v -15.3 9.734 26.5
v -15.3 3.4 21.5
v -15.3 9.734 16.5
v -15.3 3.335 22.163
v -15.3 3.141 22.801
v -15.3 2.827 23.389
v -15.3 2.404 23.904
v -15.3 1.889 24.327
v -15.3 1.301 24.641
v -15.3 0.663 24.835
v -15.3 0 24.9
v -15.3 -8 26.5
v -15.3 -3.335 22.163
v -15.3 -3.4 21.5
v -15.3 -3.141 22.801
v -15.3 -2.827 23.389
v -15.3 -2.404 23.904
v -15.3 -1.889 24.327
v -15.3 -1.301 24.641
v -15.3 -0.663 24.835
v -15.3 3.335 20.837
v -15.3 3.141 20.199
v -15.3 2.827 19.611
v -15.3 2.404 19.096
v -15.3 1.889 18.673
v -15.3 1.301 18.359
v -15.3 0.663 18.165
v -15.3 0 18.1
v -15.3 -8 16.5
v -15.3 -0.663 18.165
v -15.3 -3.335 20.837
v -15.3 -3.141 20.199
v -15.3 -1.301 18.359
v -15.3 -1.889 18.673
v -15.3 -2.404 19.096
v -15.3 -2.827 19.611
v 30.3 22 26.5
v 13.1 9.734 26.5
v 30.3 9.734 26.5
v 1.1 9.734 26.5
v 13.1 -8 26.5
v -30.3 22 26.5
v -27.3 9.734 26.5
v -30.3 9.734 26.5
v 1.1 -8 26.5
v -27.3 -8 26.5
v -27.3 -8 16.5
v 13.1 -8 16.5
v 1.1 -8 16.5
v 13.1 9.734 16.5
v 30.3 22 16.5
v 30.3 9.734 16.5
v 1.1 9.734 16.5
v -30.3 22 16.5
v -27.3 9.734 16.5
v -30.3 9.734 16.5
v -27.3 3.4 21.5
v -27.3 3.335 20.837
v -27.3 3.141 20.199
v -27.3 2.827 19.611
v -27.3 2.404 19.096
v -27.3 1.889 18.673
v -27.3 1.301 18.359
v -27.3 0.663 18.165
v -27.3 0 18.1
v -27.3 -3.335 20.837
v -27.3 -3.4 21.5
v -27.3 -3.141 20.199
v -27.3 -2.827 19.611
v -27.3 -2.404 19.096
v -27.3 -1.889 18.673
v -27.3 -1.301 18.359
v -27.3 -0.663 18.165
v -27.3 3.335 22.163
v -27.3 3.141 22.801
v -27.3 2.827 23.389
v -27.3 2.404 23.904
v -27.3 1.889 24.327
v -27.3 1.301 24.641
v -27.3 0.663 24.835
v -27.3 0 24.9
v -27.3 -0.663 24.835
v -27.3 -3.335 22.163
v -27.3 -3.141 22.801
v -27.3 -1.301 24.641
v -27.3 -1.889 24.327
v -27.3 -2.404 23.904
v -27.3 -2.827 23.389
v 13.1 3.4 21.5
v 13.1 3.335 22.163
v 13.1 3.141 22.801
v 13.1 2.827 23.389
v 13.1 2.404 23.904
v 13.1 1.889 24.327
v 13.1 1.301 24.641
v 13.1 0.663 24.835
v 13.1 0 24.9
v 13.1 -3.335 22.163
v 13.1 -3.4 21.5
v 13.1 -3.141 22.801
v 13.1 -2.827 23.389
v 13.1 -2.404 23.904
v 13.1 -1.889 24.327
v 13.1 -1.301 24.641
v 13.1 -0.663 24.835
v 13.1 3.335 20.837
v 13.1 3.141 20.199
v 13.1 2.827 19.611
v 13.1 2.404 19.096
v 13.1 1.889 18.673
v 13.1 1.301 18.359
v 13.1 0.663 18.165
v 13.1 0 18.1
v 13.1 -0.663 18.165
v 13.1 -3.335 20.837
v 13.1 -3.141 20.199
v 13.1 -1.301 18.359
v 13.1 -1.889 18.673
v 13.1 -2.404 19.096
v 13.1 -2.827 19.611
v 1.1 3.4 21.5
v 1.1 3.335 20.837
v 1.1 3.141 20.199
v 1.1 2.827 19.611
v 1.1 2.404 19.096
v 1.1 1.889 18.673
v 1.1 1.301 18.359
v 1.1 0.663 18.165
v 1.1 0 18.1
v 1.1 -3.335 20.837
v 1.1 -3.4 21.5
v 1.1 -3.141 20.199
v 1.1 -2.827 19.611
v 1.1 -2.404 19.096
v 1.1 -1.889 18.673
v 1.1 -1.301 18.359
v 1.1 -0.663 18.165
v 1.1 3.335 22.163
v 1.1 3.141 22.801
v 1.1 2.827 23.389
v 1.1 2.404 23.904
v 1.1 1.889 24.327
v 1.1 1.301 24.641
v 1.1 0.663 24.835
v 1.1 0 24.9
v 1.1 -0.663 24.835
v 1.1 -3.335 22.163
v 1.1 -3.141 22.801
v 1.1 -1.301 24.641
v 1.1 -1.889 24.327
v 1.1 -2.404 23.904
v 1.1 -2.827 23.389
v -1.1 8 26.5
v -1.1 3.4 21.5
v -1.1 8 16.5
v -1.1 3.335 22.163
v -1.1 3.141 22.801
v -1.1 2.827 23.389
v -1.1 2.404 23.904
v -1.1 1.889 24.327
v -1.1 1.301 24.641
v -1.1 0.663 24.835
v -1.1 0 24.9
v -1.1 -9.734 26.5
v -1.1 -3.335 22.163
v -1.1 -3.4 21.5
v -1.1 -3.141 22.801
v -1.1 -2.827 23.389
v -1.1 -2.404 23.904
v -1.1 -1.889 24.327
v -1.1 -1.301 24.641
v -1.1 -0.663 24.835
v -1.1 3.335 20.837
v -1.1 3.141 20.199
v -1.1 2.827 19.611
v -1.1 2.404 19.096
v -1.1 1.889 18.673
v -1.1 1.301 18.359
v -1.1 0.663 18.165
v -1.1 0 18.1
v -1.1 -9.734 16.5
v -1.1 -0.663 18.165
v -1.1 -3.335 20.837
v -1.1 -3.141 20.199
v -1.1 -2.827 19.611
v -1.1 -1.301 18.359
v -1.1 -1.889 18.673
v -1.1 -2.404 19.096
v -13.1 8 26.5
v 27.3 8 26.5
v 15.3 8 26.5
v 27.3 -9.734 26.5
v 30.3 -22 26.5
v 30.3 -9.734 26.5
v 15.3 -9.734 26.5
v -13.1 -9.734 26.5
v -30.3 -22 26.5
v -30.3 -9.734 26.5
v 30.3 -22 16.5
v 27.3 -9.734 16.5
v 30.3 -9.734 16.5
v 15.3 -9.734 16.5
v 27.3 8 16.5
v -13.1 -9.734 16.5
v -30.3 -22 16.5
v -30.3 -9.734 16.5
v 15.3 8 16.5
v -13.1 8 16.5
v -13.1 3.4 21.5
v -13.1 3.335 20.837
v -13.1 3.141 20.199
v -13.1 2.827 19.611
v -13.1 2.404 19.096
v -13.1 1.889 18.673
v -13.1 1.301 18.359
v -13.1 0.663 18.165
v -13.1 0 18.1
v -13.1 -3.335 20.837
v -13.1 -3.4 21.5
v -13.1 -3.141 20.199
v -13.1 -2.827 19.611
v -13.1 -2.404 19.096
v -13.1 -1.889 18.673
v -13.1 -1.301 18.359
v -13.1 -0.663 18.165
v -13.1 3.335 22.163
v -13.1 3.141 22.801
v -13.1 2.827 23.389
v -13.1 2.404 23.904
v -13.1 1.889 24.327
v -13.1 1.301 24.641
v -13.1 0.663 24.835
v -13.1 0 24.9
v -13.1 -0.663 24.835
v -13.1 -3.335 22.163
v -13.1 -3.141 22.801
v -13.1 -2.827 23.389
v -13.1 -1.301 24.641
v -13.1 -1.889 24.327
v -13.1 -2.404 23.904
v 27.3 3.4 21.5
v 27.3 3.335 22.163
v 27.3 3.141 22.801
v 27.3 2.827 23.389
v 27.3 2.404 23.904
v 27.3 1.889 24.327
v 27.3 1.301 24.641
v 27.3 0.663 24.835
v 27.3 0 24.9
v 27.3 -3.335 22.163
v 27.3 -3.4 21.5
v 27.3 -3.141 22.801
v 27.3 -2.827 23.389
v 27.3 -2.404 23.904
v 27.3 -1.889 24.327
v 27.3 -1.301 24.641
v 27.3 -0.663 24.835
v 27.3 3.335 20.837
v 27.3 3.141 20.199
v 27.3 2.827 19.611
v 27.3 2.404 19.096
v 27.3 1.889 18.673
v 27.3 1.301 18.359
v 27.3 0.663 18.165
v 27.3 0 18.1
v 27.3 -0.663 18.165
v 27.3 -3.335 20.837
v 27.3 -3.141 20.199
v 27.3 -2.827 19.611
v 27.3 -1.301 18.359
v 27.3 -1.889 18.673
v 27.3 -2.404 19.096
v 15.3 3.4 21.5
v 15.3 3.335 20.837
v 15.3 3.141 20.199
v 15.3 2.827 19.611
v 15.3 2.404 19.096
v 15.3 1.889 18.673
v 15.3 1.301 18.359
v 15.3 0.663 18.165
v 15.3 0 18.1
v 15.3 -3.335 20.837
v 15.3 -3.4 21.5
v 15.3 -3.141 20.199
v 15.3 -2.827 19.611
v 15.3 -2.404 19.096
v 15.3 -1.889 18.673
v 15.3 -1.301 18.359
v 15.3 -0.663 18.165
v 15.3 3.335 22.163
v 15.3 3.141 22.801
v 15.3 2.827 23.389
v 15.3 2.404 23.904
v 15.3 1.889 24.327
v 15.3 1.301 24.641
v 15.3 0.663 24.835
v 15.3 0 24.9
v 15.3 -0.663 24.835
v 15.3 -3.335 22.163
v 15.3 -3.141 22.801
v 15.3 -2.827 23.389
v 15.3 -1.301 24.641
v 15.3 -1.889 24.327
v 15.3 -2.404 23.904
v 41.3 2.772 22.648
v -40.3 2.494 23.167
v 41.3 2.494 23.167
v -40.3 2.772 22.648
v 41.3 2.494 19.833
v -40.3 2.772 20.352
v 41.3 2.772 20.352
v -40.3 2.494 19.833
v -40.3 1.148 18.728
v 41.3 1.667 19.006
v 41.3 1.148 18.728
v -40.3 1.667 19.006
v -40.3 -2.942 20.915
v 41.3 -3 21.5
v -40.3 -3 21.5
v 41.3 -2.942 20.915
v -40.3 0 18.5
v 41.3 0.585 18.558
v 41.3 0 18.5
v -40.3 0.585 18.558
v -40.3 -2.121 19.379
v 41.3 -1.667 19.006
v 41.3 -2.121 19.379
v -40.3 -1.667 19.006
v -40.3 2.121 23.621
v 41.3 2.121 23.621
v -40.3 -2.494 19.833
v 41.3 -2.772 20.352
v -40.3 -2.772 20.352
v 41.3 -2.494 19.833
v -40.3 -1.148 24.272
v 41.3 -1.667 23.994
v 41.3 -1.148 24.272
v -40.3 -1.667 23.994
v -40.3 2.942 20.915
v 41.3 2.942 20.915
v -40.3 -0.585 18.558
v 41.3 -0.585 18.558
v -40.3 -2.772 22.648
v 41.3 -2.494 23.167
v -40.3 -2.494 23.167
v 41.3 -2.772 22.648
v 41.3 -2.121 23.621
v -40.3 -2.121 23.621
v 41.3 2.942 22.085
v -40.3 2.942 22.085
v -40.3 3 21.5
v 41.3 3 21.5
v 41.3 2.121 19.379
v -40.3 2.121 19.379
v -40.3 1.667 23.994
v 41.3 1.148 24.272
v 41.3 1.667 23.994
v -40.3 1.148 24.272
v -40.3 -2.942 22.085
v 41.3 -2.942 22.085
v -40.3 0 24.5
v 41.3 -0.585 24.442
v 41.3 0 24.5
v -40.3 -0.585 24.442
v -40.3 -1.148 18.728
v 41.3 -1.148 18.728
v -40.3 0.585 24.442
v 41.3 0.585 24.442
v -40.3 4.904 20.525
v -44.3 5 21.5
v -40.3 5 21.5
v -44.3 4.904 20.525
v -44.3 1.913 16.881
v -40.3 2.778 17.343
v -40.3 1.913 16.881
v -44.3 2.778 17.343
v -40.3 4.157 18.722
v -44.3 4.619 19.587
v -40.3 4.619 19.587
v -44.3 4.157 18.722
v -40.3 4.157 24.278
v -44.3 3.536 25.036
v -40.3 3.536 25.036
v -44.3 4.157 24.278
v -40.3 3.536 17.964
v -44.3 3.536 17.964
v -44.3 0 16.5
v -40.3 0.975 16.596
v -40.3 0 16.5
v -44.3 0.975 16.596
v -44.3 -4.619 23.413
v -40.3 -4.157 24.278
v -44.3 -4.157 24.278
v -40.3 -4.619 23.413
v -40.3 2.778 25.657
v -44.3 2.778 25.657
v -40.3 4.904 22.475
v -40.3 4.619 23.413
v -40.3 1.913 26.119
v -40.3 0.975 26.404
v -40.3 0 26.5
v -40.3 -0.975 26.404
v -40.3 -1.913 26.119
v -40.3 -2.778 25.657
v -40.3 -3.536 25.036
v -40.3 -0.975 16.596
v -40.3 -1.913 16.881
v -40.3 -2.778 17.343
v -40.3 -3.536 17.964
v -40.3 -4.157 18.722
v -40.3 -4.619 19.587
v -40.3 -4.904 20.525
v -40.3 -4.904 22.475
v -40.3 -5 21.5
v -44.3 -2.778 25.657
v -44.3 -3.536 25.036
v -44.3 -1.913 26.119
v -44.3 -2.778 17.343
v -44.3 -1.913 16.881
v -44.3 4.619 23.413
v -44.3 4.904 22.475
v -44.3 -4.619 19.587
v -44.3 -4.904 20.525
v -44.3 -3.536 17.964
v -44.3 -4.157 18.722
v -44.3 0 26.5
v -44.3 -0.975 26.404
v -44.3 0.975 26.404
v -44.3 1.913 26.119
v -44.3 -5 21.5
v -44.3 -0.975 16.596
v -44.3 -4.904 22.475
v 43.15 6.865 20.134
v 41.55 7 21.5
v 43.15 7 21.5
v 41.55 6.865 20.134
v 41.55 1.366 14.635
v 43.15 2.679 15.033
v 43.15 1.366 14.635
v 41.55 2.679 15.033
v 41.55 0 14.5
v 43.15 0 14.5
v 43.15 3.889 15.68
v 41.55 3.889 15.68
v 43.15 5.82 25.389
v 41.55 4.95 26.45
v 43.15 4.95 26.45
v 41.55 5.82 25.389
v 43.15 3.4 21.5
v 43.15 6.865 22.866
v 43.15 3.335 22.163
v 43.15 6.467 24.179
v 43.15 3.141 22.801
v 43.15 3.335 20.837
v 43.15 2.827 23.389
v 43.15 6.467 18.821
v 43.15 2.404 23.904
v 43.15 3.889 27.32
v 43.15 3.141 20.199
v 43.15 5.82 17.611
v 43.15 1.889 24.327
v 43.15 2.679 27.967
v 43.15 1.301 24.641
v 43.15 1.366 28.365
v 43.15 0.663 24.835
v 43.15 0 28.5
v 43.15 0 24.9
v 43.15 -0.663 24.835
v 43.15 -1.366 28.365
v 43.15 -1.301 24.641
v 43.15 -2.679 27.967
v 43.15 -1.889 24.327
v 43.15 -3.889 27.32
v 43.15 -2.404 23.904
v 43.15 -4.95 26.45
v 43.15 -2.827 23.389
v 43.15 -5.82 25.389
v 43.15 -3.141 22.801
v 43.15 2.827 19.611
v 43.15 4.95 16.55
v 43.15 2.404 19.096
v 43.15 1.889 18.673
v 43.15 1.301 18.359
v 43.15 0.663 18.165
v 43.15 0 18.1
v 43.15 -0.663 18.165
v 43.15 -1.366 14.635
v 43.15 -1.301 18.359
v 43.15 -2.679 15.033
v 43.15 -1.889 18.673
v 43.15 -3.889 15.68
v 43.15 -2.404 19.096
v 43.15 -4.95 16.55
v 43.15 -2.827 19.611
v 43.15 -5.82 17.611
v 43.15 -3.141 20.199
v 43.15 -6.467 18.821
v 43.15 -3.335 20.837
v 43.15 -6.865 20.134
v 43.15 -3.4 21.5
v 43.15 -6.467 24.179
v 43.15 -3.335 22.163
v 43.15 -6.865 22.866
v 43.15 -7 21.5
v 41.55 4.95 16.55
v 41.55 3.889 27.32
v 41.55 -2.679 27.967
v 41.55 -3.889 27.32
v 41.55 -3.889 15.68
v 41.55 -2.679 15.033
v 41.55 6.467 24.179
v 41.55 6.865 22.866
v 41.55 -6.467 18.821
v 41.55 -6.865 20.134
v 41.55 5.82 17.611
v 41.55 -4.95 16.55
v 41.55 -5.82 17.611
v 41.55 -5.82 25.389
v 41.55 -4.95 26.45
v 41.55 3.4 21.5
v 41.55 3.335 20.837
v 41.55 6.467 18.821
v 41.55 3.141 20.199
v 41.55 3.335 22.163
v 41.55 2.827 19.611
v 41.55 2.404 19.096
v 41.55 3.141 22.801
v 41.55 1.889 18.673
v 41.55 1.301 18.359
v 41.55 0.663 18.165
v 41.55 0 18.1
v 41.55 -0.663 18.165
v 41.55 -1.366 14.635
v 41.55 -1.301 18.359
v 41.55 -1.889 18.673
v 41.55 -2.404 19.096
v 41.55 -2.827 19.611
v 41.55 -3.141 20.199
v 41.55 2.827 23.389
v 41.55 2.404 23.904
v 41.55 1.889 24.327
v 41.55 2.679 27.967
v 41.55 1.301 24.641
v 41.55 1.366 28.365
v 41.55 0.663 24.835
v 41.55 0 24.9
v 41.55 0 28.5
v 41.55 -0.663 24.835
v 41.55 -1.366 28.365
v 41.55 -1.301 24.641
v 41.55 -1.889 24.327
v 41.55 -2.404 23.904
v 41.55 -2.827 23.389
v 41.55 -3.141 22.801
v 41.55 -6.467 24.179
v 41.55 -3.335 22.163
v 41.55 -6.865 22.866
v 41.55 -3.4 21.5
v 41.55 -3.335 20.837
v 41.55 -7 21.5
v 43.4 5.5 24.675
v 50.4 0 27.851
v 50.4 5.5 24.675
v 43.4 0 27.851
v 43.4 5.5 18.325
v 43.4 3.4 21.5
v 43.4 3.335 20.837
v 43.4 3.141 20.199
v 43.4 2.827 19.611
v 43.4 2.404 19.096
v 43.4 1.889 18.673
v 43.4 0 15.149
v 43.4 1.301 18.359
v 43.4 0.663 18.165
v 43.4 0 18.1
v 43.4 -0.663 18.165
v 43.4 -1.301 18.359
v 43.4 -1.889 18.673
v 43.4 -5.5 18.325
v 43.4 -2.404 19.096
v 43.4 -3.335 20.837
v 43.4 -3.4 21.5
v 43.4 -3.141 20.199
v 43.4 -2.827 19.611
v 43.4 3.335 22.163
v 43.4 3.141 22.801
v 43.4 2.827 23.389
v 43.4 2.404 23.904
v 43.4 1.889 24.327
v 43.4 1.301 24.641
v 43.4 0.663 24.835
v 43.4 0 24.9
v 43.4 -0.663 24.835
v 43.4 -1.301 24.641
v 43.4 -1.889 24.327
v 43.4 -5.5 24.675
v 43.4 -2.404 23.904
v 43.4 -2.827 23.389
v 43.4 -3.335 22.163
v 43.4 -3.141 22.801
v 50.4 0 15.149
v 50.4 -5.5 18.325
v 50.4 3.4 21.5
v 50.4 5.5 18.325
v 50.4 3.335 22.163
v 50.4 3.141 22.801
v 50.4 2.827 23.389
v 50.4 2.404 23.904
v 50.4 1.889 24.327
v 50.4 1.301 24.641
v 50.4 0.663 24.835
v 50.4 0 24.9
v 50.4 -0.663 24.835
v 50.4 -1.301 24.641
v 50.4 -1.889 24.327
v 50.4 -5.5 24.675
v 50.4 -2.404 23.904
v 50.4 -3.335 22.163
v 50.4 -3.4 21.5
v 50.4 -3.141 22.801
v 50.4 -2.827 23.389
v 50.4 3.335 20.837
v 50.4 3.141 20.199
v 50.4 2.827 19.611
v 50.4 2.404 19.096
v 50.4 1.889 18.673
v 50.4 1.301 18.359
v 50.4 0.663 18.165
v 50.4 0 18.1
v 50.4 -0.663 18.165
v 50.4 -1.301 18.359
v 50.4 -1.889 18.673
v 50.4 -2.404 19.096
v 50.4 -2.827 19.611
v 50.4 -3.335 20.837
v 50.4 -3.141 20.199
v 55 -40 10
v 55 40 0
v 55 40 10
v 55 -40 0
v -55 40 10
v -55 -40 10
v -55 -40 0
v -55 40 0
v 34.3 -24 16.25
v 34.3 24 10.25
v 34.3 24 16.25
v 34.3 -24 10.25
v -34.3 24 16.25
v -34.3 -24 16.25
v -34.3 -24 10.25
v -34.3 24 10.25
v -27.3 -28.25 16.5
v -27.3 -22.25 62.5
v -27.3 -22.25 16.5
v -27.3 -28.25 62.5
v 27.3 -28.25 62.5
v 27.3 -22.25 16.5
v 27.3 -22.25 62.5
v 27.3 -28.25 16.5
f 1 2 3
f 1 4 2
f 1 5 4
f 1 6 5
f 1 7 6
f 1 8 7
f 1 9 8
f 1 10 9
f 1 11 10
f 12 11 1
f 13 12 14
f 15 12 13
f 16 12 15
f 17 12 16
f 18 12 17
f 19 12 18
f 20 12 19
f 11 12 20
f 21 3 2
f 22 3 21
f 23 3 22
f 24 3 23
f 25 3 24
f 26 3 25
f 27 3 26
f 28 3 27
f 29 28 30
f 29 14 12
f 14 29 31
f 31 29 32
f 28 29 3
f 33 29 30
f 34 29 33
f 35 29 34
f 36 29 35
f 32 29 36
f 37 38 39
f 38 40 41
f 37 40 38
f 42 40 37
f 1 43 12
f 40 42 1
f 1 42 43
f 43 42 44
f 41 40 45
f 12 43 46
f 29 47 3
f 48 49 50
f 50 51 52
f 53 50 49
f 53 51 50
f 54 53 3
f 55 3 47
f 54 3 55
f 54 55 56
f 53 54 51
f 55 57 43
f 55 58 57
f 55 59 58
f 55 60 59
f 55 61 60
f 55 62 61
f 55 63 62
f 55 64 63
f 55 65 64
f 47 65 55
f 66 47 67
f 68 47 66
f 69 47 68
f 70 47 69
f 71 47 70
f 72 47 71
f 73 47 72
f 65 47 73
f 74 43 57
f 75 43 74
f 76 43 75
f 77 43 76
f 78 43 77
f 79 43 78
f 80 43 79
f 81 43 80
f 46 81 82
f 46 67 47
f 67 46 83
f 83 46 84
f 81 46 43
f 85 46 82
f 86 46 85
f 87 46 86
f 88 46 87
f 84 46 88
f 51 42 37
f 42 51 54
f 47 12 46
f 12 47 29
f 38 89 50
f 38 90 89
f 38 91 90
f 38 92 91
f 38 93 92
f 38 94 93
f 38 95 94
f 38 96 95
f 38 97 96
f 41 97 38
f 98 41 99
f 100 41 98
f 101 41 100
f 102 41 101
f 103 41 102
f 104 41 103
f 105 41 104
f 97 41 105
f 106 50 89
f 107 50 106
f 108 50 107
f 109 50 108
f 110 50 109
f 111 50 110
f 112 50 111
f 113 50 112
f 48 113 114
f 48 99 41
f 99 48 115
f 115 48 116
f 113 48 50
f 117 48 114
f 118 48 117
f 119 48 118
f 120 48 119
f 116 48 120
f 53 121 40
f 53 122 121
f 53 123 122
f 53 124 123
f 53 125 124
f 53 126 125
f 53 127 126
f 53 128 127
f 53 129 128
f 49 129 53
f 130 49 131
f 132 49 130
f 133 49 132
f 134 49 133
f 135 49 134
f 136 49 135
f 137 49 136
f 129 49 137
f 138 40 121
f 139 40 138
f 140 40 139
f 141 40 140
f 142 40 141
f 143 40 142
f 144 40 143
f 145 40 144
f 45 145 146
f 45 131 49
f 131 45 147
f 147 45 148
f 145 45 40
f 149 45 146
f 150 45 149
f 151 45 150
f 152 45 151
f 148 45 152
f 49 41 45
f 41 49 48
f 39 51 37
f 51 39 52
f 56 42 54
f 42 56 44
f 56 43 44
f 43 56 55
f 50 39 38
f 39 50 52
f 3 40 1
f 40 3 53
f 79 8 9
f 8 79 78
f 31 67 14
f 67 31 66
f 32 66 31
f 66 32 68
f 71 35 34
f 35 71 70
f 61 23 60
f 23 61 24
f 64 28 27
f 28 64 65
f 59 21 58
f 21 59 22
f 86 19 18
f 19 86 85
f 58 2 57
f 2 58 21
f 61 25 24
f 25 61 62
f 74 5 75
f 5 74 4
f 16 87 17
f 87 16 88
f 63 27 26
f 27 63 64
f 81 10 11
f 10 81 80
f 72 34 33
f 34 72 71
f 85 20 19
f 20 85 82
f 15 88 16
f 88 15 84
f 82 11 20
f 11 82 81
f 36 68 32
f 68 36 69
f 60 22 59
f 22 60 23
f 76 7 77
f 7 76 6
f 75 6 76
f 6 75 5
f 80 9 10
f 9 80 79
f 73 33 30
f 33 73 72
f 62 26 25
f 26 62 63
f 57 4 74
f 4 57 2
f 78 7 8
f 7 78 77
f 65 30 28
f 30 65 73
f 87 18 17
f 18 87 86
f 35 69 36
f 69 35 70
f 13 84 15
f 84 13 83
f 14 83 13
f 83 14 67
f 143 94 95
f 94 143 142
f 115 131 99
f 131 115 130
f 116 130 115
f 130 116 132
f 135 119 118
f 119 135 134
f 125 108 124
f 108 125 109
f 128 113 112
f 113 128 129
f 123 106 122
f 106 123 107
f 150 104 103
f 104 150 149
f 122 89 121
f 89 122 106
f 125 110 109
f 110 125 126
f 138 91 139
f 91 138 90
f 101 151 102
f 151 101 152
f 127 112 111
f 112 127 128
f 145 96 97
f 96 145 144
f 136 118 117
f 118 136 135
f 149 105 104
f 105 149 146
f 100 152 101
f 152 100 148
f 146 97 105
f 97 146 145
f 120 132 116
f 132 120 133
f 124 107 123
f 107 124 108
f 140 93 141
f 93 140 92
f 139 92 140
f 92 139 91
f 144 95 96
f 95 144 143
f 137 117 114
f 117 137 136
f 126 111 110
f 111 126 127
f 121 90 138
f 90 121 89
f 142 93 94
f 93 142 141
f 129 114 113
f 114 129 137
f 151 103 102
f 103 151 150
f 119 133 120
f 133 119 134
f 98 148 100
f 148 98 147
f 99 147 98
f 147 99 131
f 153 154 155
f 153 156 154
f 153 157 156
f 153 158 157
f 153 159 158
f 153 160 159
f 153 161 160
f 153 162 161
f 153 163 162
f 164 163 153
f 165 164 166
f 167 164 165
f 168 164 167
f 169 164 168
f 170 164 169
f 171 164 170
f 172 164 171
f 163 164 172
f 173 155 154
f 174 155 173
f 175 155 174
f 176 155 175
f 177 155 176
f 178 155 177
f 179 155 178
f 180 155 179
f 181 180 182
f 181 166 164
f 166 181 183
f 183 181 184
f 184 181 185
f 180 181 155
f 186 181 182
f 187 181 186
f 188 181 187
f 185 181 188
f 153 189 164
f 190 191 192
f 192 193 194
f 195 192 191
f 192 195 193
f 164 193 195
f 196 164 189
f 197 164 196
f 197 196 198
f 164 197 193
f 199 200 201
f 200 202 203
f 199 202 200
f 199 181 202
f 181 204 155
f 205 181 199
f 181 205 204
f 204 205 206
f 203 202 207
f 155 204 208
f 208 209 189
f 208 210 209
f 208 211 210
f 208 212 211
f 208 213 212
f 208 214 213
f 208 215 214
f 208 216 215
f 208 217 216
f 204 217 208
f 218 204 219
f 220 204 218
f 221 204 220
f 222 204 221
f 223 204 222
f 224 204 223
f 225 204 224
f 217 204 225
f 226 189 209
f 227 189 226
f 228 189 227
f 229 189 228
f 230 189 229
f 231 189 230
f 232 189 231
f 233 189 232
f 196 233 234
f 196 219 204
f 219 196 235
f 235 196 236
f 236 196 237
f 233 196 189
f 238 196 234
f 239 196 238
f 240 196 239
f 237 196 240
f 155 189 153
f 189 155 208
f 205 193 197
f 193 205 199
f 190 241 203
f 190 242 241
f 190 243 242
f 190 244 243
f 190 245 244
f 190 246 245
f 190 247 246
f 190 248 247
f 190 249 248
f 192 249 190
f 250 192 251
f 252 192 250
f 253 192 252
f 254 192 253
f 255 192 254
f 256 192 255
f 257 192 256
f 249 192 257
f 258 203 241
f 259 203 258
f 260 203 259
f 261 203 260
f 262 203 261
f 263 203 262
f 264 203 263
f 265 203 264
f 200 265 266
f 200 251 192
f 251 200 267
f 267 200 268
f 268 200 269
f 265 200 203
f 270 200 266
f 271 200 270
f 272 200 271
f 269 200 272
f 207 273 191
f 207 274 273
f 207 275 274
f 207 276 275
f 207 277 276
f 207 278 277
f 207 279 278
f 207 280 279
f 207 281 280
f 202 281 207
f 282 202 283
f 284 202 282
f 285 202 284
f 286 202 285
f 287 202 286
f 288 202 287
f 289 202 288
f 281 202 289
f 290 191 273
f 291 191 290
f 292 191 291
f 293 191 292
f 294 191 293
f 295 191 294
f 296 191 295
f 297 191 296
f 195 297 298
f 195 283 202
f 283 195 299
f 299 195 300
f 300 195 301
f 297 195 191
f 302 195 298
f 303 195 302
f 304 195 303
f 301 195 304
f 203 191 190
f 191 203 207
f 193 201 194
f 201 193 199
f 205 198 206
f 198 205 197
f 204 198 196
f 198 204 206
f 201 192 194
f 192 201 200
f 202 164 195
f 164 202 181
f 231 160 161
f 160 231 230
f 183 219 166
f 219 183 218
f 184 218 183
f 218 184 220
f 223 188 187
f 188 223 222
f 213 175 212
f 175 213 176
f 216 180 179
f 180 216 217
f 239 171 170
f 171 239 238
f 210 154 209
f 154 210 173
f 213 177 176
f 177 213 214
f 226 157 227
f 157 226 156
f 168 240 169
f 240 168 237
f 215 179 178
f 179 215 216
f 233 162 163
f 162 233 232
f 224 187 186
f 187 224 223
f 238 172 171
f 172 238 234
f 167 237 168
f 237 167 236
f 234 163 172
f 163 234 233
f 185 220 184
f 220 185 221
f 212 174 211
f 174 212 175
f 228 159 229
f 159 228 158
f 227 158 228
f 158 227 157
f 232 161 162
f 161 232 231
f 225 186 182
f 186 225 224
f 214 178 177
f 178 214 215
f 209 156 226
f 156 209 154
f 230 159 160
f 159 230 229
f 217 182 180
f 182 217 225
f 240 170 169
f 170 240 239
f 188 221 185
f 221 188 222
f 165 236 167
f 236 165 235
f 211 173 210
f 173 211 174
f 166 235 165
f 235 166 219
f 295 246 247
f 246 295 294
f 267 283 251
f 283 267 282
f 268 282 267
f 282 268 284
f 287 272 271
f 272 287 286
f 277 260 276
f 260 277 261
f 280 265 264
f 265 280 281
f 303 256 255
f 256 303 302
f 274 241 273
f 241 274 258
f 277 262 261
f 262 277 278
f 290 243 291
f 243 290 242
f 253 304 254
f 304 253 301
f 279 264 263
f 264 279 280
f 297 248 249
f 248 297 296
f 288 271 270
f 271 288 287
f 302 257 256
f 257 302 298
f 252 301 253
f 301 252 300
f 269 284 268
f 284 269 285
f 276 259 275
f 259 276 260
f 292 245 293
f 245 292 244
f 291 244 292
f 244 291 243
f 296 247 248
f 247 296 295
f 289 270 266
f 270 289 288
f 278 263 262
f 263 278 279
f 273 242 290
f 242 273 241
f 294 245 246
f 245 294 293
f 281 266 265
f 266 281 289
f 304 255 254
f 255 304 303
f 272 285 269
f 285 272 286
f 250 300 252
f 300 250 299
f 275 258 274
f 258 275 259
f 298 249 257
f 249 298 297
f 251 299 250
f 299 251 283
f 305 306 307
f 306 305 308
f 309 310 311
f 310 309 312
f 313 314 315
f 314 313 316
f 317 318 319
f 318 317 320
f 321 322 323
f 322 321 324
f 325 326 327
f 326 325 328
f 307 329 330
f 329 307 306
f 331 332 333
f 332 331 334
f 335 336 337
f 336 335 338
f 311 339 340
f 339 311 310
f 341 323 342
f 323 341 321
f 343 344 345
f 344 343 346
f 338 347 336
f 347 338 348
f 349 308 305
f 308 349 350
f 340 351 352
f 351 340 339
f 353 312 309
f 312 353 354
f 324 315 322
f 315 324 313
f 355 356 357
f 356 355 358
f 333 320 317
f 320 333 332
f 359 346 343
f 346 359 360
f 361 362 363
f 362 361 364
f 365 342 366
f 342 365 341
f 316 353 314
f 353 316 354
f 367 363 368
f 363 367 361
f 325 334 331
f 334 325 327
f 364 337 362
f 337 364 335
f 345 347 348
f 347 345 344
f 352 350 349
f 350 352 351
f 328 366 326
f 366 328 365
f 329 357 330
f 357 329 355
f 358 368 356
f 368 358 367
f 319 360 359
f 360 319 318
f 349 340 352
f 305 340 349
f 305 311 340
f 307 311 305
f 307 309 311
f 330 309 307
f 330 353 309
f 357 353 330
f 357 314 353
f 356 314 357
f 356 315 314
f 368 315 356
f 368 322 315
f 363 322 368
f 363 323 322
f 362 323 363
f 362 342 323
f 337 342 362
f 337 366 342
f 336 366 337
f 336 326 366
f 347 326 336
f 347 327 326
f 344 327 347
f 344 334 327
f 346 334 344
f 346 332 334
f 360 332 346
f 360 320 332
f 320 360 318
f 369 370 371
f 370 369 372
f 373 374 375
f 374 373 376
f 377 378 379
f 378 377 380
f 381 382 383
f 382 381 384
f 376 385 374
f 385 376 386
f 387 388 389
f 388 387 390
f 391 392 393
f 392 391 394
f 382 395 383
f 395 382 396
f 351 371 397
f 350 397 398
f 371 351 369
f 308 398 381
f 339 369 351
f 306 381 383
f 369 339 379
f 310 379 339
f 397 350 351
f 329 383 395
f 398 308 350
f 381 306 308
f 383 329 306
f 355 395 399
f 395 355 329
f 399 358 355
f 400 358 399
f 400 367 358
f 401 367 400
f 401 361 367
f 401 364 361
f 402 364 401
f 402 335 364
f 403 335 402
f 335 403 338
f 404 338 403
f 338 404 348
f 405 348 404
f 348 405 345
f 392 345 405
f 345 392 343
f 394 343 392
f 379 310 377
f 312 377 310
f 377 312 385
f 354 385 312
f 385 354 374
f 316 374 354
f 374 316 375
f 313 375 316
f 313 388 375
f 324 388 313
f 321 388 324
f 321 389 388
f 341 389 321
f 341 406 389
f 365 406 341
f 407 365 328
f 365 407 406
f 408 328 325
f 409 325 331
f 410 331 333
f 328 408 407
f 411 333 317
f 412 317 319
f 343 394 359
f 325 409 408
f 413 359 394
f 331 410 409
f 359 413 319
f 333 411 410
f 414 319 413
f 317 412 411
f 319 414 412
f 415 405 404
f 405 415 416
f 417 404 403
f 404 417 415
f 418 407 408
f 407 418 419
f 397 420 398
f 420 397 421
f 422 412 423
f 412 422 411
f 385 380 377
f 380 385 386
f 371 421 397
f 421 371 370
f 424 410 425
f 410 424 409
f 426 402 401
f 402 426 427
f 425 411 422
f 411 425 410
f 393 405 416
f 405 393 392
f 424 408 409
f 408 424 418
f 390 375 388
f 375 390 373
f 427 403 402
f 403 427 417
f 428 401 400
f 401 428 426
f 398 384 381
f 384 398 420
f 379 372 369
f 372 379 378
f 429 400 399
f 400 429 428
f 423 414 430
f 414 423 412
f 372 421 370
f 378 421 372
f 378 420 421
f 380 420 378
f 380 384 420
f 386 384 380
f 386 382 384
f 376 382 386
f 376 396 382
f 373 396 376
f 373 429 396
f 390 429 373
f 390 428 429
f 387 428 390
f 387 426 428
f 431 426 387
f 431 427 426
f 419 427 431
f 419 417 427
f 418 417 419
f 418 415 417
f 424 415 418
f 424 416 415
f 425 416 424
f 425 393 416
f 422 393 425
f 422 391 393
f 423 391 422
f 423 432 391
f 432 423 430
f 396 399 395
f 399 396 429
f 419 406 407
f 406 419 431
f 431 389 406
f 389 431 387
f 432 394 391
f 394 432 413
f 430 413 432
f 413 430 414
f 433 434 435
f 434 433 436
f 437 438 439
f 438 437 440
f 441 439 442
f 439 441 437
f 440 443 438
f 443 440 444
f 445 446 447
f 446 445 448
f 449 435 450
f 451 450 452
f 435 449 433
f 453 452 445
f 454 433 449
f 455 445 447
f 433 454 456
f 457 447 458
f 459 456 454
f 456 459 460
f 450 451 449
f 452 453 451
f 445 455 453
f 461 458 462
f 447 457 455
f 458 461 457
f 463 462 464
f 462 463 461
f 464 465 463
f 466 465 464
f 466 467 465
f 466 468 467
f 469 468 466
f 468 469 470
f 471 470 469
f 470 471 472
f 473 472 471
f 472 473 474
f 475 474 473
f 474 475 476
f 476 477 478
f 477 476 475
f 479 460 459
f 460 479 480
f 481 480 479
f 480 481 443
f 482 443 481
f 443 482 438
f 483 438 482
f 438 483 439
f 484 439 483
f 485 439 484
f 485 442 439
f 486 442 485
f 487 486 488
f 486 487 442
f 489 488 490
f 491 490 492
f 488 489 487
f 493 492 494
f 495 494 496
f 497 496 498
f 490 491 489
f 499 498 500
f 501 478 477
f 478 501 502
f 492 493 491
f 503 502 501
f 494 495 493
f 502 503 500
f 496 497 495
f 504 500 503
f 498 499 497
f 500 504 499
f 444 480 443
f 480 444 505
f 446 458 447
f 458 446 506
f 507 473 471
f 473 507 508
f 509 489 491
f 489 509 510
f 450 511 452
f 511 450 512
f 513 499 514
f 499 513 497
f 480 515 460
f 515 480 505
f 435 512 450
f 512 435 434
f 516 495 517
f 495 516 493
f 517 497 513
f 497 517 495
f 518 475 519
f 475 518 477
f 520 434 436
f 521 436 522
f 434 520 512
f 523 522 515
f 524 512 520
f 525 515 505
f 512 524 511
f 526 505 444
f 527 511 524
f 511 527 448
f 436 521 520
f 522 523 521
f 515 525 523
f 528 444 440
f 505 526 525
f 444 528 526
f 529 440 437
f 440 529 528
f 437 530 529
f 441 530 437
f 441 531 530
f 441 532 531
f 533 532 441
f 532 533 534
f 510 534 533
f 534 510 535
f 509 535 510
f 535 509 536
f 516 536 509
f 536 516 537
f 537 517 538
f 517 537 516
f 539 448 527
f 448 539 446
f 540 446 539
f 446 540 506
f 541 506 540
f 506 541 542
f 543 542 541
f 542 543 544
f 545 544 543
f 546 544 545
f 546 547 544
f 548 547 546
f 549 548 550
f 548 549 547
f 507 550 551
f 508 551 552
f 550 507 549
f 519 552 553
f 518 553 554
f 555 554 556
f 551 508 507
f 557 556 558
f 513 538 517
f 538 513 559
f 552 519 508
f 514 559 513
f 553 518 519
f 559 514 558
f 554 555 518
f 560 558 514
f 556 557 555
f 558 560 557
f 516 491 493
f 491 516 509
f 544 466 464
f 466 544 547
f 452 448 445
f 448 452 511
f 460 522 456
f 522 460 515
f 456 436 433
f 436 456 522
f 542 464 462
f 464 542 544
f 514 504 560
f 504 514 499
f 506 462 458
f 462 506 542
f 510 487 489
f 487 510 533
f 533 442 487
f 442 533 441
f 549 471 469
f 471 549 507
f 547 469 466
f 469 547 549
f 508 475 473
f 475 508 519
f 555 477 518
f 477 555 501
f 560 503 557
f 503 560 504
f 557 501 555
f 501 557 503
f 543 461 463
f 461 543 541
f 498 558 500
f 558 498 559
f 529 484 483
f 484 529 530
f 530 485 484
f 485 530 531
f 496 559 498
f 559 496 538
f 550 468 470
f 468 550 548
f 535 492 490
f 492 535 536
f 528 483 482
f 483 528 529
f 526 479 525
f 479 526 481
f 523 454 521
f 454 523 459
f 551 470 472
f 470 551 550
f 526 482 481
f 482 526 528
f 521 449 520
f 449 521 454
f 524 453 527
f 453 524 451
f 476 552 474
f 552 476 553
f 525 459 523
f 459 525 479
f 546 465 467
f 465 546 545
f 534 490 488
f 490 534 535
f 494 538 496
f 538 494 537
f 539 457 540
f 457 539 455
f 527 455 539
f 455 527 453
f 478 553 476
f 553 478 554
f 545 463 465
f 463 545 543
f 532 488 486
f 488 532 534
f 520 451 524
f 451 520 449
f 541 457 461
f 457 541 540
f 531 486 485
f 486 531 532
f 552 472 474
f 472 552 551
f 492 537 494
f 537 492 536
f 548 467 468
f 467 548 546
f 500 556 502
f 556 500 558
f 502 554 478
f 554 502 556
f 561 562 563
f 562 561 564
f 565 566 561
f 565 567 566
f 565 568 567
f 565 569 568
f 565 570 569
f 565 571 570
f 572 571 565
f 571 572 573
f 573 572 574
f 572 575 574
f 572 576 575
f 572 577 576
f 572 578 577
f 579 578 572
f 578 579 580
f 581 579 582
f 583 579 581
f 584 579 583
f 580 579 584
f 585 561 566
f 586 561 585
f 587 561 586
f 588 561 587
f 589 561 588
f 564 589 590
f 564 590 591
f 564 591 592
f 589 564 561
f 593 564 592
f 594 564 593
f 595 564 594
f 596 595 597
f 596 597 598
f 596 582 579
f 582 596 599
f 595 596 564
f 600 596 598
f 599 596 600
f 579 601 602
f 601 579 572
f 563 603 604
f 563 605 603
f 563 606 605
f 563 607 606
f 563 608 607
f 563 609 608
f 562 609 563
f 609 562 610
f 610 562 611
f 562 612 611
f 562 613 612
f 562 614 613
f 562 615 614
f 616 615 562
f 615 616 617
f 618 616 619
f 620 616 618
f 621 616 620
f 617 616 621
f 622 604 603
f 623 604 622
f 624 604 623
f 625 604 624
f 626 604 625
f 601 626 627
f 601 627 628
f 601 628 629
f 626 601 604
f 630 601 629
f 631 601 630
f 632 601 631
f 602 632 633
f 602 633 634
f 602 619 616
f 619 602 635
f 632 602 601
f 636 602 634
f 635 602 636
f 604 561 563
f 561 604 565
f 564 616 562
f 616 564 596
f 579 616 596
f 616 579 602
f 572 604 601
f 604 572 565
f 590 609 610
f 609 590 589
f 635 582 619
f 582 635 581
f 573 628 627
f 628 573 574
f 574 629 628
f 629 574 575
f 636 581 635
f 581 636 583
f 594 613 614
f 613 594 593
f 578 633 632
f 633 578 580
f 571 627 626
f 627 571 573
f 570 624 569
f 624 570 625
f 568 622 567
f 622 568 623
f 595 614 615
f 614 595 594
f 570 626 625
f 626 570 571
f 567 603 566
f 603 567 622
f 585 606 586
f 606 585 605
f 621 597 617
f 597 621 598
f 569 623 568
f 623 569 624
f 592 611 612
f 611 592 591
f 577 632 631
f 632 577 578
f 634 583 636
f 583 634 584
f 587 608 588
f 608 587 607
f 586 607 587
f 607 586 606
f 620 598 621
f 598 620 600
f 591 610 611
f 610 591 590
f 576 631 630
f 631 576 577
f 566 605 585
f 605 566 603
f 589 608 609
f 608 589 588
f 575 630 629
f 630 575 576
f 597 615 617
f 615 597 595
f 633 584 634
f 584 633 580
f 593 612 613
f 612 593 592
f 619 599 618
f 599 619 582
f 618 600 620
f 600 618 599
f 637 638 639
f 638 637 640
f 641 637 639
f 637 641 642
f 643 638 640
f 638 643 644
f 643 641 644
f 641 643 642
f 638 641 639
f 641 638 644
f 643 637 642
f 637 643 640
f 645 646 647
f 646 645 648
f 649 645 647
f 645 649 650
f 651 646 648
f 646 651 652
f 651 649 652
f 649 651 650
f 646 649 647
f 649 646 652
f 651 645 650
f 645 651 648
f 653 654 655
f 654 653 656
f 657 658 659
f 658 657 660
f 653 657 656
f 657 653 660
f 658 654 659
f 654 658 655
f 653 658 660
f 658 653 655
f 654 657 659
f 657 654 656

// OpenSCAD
$fn = 32;

// ------------------------------------------------------------------------
// Comb hinge with flap: leaf 60.6 x 22 mm, pin d6, flap 46 mm
// Every part is its own module, assembly() places every instance.
// ------------------------------------------------------------------------

// --- part 1 ---
module hinge_bed() {
  difference() {
    translate([-55, -40, 0]) cube([110, 80, 10]);
  }
}

// --- part 2 ---
module hinge_riser() {
  difference() {
    translate([-34.3, -24, 0]) cube([68.6, 48, 6]);
  }
}

// --- part 3 ---
module hinge_leaf_a() {
  difference() {
    union() {
      translate([-27.3, -8, -5]) cube([12, 30, 10]);
      translate([1.1, -8, -5]) cube([12, 30, 10]);
      translate([-30.3, 9.734, -5]) cube([60.6, 12.266, 10]);
    }
    translate([-21.3, 0, 0]) rotate([0, 90, 0]) cylinder(h = 14, d = 6.8, center = true);
    translate([7.1, 0, 0]) rotate([0, 90, 0]) cylinder(h = 14, d = 6.8, center = true);
  }
}

// --- part 4 ---
module hinge_leaf_b() {
  difference() {
    union() {
      translate([-13.1, -22, -5]) cube([12, 30, 10]);
      translate([15.3, -22, -5]) cube([12, 30, 10]);
      translate([-30.3, -22, -5]) cube([60.6, 12.266, 10]);
    }
    translate([-7.1, 0, 0]) rotate([0, 90, 0]) cylinder(h = 14, d = 6.8, center = true);
    translate([21.3, 0, 0]) rotate([0, 90, 0]) cylinder(h = 14, d = 6.8, center = true);
  }
}

// --- part 5 ---
module hinge_flap() {
  difference() {
    translate([-27.3, -23, 0]) cube([54.6, 46, 6]);
  }
}

// --- part 6 ---
module hinge_pin() {
  rotate([0, 90, 0]) cylinder(h = 82.6, d = 6, center = true);
  translate([-44.3, 0, 0]) rotate([0, 90, 0]) cylinder(h = 4, d = 10);
}

// --- part 7 ---
module pin_washer() {
  difference() {
      translate([0, 0, 0]) cylinder(h = 1.6, d = 14);
      translate([0, 0, -1]) cylinder(h = 3.6, d = 6.8);
    }
}

// --- part 8 ---
module pin_nut() {
  difference() {
    linear_extrude(height = 7) polygon(points = [[6.351, 0], [3.175, 5.5], [-3.175, 5.5], [-6.351, 0], [-3.175, -5.5], [3.175, -5.5]]);
    translate([0, 0, -1]) cylinder(h = 9, d = 6.8);
  }
}

// --- assembly ---
module assembly() {
  color([0.80, 0.24, 0.20]) translate([0, 0, 0]) rotate([0, 0, 0]) hinge_bed();
  color([0.20, 0.45, 0.75]) translate([0, 0, 10.25]) rotate([0, 0, 0]) hinge_riser();
  color([0.25, 0.62, 0.32]) translate([0, 0, 21.5]) rotate([0, 0, 0]) hinge_leaf_a();
  color([0.92, 0.70, 0.18]) translate([0, 0, 21.5]) rotate([0, 0, 0]) hinge_leaf_b();
  color([0.58, 0.35, 0.70]) translate([0, -22.25, 39.5]) rotate([90, 0, 0]) hinge_flap();
  color([0.16, 0.66, 0.66]) translate([0, 0, 21.5]) rotate([0, 0, 0]) hinge_pin();
  color([0.85, 0.48, 0.18]) translate([41.55, 0, 21.5]) rotate([0, 90, 0]) pin_washer();
  color([0.55, 0.60, 0.65]) translate([43.4, 0, 21.5]) rotate([0, 90, 0]) pin_nut();
}

assembly();
